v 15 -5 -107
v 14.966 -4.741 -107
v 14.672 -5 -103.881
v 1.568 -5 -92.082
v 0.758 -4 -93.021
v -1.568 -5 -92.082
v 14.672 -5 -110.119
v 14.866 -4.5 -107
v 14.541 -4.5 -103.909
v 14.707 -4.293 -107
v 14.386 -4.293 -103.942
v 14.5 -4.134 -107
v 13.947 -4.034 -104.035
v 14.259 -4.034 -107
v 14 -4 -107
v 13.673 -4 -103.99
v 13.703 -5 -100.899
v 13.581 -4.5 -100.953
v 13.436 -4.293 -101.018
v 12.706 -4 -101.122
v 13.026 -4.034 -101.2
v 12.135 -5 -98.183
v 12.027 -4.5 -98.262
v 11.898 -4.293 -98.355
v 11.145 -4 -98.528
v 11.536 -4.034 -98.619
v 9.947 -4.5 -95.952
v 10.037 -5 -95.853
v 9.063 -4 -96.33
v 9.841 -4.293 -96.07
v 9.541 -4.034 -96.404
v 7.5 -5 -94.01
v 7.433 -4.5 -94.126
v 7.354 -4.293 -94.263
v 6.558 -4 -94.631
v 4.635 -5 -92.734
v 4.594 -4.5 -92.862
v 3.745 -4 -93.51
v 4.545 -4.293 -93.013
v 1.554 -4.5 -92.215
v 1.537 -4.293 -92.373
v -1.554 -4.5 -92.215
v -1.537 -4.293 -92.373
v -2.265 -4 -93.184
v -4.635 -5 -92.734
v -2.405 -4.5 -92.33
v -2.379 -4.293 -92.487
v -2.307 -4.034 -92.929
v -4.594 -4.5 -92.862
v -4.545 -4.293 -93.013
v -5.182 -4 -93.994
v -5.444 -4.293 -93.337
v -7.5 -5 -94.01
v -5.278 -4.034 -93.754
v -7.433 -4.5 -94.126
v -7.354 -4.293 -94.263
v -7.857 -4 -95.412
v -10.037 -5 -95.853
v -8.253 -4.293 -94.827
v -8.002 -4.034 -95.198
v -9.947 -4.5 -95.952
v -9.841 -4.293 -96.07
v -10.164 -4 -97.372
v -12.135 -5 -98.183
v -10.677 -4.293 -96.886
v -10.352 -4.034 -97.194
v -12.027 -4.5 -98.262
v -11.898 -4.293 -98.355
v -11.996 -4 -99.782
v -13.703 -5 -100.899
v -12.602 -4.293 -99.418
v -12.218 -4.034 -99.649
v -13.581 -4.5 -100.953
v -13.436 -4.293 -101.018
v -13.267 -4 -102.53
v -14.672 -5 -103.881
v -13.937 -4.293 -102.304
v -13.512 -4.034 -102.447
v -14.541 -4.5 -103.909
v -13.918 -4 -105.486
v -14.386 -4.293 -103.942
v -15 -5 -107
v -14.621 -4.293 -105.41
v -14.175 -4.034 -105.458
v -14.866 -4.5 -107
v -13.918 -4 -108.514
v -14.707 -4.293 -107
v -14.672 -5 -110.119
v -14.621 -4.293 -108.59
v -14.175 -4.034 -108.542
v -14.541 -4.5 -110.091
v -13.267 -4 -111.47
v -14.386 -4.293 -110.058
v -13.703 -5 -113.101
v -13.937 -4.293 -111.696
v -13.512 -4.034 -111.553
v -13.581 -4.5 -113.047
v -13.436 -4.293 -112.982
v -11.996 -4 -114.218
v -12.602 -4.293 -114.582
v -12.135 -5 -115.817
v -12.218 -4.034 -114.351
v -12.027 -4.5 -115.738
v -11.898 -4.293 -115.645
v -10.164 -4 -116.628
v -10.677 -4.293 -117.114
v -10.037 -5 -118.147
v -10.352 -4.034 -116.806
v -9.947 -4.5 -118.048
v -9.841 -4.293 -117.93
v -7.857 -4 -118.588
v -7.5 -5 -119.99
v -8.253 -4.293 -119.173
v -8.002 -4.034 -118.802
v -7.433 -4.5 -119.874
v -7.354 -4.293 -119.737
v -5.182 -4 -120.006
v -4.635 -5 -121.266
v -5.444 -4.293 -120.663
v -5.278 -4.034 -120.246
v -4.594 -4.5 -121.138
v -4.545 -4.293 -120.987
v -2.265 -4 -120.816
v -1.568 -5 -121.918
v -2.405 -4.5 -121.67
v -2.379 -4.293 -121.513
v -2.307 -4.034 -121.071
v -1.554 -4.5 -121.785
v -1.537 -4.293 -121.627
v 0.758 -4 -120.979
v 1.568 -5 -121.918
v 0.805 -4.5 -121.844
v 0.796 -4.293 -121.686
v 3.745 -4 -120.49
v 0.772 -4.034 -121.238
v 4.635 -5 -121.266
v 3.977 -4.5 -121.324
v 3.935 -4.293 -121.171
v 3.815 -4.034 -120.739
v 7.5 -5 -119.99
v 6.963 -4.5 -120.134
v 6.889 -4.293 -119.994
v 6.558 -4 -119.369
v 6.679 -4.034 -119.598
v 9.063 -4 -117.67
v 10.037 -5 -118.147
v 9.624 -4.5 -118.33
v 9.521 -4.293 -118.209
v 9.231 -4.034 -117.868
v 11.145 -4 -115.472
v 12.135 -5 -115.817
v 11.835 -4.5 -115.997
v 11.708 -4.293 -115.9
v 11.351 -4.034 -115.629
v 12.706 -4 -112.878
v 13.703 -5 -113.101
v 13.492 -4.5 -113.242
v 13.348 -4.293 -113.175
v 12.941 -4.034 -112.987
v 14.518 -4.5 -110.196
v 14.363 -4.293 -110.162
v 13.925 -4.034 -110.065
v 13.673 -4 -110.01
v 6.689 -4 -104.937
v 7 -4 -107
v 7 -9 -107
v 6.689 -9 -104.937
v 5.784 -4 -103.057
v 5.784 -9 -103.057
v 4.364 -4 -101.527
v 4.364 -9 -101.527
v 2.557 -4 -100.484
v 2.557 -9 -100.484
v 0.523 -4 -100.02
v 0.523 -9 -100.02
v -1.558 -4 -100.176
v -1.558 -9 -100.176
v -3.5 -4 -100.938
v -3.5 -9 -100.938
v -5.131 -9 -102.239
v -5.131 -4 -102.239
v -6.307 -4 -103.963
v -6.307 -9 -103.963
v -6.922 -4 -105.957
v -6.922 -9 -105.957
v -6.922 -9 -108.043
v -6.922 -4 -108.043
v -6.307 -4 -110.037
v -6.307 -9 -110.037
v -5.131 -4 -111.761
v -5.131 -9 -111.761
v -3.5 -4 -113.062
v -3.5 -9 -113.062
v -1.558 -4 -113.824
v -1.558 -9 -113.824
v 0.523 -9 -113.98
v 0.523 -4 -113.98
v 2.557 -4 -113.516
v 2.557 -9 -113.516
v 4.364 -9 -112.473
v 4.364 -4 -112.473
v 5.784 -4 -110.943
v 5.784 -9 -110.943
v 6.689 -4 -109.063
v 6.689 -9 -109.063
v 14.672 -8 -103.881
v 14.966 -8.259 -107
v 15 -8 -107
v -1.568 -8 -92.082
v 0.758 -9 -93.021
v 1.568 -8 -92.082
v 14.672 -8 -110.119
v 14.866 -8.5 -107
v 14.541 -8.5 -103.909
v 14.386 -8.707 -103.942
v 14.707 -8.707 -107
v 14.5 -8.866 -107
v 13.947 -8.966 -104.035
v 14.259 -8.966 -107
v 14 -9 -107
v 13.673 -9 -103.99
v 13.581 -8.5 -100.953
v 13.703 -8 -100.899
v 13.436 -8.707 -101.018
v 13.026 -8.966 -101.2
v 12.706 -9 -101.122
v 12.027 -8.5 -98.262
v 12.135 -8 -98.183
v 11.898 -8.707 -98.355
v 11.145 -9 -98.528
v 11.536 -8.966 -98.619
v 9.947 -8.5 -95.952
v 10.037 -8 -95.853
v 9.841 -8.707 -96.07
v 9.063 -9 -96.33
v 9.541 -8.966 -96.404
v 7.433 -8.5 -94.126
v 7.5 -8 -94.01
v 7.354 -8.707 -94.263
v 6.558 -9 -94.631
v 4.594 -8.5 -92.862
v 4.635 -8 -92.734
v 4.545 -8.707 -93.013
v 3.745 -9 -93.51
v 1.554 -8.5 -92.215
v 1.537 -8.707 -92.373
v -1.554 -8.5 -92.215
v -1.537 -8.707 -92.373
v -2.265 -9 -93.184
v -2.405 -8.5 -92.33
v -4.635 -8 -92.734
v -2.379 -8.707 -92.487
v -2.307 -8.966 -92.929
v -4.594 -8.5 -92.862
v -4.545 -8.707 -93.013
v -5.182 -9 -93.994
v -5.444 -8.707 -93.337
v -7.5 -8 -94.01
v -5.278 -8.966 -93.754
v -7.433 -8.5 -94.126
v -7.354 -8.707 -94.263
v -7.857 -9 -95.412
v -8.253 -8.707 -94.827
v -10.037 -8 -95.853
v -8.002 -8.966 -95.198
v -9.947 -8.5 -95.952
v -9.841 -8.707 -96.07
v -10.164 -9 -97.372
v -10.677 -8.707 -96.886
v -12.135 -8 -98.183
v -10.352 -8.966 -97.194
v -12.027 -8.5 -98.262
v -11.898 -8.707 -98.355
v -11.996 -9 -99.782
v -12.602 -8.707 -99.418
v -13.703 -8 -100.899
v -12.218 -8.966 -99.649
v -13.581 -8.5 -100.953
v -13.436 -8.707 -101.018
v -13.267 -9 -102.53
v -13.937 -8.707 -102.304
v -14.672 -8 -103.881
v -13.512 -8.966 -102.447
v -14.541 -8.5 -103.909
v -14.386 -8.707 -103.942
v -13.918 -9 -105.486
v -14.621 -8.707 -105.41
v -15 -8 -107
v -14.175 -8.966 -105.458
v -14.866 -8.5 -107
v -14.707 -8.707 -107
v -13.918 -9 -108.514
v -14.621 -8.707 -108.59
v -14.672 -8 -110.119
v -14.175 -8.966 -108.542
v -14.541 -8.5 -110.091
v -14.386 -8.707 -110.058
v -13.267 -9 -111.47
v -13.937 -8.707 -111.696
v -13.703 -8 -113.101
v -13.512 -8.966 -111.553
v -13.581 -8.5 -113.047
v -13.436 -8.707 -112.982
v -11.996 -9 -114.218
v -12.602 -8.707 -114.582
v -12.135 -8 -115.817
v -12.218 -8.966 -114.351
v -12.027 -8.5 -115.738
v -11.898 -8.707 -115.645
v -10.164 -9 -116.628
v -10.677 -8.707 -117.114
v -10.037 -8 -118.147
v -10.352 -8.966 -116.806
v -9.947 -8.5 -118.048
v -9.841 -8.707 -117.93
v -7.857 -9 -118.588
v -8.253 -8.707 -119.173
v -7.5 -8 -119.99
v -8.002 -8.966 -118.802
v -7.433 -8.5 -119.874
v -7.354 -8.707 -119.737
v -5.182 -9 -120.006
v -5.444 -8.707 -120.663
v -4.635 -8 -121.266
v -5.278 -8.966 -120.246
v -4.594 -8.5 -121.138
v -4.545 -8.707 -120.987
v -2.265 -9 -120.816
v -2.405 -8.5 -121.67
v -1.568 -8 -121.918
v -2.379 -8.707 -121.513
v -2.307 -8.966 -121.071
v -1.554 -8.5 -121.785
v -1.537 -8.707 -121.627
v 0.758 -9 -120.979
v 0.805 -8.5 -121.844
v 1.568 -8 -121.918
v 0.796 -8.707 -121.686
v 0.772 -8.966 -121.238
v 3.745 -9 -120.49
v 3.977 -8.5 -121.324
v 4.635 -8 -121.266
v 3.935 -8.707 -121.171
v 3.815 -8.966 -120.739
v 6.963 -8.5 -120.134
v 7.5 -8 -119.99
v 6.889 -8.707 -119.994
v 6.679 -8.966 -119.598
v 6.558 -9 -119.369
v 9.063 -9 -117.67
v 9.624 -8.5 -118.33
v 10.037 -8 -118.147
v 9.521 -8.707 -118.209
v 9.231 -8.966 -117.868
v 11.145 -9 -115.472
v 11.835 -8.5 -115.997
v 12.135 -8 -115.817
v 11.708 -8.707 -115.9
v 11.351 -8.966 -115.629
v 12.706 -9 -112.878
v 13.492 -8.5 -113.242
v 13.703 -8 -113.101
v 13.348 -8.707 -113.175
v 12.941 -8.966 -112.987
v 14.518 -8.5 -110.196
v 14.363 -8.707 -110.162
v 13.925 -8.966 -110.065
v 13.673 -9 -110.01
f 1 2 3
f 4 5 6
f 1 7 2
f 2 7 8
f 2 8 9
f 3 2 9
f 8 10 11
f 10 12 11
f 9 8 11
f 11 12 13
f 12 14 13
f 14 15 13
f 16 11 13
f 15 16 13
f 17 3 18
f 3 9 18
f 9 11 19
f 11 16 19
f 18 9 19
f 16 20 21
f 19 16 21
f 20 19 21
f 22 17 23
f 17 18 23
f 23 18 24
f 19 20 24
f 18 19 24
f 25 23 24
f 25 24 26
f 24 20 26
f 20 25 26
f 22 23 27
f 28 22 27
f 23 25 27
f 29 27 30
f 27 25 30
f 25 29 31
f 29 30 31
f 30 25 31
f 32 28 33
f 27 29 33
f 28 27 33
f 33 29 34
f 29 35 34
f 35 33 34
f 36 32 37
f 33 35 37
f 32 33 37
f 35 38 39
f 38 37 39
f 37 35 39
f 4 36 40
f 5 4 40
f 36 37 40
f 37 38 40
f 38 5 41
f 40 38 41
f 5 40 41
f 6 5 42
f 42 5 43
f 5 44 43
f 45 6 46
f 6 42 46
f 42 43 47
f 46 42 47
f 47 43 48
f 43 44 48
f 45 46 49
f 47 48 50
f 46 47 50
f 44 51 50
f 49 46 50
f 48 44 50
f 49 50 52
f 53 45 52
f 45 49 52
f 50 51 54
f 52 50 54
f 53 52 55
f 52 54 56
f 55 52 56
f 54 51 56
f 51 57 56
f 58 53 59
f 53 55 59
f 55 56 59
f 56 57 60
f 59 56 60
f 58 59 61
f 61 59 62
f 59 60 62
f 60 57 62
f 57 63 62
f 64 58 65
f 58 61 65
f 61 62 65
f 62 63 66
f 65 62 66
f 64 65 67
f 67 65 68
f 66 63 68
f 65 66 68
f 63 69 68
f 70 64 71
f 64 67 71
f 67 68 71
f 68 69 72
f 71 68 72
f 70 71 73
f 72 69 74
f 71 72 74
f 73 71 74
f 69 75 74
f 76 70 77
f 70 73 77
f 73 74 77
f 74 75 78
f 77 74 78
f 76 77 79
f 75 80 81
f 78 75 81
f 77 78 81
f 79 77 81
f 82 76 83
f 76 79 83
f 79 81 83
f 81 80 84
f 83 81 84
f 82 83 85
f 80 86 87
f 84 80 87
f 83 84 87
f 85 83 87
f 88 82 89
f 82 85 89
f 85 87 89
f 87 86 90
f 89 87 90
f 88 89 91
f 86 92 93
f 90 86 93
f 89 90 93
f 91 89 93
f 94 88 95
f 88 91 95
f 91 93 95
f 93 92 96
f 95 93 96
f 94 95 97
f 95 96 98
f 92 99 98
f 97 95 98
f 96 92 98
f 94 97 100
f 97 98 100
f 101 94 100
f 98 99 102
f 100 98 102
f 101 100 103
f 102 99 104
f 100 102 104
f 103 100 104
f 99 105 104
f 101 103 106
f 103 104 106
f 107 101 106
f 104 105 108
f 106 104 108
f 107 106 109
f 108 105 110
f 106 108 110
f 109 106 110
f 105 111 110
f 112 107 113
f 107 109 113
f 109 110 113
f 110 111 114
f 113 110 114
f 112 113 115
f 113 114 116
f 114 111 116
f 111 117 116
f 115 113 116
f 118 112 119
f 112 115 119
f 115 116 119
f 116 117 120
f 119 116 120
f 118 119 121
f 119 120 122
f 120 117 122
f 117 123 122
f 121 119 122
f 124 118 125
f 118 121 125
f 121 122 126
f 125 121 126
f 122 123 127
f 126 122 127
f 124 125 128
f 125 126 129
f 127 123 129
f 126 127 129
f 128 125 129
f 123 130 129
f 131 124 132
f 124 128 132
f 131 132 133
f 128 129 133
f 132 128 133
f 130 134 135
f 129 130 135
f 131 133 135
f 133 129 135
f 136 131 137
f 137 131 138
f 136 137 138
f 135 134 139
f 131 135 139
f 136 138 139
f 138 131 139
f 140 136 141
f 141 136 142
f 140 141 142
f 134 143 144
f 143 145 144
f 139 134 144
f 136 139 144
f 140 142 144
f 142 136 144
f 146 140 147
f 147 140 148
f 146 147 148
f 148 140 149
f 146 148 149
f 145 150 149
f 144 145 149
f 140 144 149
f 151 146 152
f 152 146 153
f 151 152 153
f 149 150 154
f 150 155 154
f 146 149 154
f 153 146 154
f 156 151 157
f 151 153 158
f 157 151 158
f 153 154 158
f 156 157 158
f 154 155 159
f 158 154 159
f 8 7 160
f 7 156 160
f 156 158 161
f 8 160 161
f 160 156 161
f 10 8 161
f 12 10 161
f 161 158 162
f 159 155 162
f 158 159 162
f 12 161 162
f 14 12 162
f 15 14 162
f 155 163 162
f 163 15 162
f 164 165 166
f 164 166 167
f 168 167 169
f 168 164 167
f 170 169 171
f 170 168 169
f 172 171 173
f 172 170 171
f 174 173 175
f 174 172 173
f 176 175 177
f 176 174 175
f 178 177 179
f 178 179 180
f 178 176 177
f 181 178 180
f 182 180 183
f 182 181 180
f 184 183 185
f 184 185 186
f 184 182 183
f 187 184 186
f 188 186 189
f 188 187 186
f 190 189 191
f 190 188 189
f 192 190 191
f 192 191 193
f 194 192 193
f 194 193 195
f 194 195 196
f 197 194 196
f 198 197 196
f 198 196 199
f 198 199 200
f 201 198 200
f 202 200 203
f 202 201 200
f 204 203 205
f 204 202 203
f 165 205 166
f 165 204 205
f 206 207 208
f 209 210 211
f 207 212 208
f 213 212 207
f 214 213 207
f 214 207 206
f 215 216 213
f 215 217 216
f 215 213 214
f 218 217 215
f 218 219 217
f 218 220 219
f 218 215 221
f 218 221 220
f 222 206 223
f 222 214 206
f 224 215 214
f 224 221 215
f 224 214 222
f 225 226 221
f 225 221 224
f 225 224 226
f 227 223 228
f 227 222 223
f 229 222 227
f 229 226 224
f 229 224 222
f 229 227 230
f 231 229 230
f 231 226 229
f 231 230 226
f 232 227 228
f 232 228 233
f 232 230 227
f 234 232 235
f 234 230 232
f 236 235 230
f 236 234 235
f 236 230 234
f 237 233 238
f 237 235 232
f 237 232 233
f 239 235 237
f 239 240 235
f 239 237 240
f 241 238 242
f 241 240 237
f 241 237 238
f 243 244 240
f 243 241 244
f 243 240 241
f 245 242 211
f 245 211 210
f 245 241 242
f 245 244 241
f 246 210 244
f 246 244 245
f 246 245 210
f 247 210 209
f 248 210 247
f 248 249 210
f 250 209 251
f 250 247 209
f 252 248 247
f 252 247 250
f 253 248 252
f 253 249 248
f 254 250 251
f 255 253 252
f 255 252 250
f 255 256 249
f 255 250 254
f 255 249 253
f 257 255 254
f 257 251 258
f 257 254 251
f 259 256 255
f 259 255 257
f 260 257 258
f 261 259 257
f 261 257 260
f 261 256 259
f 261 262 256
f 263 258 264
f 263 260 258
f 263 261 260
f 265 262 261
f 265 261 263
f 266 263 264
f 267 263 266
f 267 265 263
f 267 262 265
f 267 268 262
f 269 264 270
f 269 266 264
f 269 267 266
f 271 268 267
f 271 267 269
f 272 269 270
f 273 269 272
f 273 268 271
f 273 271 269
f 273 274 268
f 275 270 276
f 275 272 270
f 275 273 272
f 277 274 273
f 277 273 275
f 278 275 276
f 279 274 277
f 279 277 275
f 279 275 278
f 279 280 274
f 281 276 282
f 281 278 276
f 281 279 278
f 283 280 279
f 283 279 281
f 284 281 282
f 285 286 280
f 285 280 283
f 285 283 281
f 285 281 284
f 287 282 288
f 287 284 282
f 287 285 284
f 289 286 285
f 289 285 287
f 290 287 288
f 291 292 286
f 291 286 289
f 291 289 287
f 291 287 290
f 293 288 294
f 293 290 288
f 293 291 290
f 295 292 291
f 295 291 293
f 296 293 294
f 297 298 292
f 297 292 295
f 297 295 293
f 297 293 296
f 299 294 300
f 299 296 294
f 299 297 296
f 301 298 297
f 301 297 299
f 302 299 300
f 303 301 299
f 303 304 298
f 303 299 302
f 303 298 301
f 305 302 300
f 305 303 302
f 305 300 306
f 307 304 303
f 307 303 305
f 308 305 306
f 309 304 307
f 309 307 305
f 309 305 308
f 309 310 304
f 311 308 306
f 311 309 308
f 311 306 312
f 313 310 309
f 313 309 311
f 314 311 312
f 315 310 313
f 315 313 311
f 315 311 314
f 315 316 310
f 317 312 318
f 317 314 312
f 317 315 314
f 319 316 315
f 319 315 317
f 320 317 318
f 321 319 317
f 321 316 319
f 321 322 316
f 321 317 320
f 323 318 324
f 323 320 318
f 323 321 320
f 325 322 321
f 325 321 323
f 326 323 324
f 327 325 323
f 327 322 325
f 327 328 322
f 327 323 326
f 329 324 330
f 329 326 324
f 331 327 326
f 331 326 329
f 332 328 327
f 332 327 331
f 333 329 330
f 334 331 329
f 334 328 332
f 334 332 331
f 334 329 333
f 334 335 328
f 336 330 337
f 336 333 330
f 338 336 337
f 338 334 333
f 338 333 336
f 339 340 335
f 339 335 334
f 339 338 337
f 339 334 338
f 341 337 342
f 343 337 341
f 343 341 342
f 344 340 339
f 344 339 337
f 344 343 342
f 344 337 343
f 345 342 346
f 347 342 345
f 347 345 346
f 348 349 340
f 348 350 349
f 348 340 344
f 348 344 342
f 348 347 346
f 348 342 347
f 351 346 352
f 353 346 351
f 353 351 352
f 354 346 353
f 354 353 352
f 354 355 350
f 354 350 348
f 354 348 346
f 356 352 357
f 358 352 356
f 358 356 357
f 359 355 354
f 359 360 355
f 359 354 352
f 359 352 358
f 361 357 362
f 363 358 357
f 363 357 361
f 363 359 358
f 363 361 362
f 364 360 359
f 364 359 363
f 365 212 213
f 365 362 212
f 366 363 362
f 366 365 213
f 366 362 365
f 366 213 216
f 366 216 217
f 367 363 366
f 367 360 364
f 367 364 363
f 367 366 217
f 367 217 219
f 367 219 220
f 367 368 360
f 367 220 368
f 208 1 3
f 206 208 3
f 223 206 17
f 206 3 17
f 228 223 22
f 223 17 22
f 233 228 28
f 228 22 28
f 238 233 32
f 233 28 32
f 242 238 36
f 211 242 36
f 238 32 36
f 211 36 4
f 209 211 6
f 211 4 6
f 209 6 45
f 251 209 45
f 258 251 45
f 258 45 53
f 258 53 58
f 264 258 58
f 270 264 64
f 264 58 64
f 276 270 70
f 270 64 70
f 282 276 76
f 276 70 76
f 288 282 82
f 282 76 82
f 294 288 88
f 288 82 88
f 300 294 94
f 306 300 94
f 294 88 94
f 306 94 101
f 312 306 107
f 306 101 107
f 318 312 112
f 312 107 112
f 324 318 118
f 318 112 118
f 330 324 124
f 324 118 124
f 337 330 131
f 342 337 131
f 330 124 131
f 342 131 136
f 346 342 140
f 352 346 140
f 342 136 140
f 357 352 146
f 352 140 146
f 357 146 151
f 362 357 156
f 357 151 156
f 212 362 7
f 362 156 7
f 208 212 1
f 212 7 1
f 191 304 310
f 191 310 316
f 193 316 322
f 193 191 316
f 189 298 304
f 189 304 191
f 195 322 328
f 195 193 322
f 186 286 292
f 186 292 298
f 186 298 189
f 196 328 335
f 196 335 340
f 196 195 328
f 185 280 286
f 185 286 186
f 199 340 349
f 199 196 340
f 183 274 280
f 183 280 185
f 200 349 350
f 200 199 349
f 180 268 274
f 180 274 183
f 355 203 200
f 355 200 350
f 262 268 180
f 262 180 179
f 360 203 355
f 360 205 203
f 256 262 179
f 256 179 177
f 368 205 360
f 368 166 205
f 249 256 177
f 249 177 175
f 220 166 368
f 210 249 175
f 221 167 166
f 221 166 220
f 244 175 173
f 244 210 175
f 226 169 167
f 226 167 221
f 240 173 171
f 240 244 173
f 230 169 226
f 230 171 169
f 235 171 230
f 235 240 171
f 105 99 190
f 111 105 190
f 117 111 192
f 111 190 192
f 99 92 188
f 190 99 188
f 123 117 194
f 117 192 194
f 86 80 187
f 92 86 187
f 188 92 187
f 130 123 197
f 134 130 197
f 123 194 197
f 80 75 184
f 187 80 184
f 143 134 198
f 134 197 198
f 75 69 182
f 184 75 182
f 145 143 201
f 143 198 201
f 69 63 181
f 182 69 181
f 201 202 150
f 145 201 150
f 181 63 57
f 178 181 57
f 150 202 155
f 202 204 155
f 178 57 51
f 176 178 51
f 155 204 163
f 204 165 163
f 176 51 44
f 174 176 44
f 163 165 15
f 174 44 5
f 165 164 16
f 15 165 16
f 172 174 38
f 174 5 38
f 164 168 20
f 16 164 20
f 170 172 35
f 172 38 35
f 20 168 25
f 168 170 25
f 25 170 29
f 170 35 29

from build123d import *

# Parameters (mm, degrees)
CYLINDER066_R     = 7
CYLINDER066_DEPTH = 5
CYLINDER067_R     = 15
CYLINDER067_DEPTH = 5
FILLET006_R       = 1
FILLET007_R       = 1


with BuildPart() as cylindre062:
    # Cylinder066 → Cylinder066 (new body)
    with BuildSketch(Plane(origin=(0, -4, -107), x_dir=(1, 0, 0), z_dir=(0, -1, 0))):
        Circle(CYLINDER066_R)
    extrude(amount=CYLINDER066_DEPTH)


with BuildPart() as fillet007:
    # Cylinder067 → Cylinder067 (new body)
    with BuildSketch(Plane(origin=(0, -4, -107), x_dir=(1, 0, 0), z_dir=(0, -1, 0))):
        Circle(CYLINDER067_R)
    extrude(amount=CYLINDER067_DEPTH)

    # Cut040: cut Cylindre062
    add(cylindre062.part, mode=Mode.SUBTRACT)

    # Fillet006
    fillet006_edges = [fillet007.edges().sort_by_distance(p)[0] for p in [
        (-15, -4, -107),
    ]]
    fillet(fillet006_edges, radius=FILLET006_R)

    # Fillet007
    fillet007_edges = [fillet007.edges().sort_by_distance(p)[0] for p in [
        (-15, -9, -107),
    ]]
    fillet(fillet007_edges, radius=FILLET007_R)


solid = fillet007.part
